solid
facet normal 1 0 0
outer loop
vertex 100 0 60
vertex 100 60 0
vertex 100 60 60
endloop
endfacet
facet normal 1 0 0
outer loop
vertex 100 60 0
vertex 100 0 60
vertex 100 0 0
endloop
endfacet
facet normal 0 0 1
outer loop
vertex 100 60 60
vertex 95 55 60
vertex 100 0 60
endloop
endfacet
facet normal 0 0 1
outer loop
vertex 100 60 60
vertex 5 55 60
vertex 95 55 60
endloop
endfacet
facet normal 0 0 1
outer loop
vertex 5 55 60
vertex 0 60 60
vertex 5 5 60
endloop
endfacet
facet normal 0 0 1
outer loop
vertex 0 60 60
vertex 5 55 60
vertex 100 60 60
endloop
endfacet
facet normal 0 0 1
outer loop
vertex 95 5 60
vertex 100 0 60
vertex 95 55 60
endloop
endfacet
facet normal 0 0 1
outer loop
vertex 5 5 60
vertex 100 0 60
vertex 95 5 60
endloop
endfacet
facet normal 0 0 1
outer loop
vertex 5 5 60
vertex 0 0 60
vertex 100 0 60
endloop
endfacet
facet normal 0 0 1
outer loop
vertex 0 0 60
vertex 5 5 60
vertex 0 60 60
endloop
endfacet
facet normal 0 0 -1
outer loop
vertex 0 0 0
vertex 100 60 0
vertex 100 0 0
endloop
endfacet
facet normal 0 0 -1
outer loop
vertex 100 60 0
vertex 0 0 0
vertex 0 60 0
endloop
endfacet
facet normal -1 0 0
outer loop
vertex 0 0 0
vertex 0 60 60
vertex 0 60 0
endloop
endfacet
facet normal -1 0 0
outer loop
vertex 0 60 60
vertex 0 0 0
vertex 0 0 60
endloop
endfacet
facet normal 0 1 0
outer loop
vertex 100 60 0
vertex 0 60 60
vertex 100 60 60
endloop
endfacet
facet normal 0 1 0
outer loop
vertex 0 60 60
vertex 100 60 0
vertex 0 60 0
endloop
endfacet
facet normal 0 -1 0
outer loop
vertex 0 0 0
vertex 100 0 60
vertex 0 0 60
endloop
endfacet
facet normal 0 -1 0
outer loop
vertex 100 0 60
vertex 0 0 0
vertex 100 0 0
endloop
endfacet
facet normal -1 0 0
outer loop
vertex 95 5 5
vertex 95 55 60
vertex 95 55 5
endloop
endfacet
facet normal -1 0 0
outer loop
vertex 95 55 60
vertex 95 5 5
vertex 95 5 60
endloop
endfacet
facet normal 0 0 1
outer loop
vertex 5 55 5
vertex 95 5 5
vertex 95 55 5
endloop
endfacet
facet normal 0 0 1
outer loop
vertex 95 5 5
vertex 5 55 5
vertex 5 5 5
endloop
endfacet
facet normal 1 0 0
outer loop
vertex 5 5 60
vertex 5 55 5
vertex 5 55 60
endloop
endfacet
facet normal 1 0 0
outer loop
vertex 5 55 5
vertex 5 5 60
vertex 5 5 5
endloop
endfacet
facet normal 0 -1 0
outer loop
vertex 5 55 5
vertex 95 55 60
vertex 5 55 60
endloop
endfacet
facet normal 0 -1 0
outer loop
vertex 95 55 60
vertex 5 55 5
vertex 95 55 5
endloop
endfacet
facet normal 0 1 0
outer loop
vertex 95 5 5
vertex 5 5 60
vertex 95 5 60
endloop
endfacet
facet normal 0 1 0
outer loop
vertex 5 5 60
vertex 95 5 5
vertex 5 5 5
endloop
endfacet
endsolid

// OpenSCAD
module qtip_holder() {
    box();
    lid();
}

module box() {
    difference() {
        cube([100, 60, 60]);
        translate([5, 5, 5]) 
        cube([90, 50, 60]);
    }
}

module lid() {
    
}

box();
